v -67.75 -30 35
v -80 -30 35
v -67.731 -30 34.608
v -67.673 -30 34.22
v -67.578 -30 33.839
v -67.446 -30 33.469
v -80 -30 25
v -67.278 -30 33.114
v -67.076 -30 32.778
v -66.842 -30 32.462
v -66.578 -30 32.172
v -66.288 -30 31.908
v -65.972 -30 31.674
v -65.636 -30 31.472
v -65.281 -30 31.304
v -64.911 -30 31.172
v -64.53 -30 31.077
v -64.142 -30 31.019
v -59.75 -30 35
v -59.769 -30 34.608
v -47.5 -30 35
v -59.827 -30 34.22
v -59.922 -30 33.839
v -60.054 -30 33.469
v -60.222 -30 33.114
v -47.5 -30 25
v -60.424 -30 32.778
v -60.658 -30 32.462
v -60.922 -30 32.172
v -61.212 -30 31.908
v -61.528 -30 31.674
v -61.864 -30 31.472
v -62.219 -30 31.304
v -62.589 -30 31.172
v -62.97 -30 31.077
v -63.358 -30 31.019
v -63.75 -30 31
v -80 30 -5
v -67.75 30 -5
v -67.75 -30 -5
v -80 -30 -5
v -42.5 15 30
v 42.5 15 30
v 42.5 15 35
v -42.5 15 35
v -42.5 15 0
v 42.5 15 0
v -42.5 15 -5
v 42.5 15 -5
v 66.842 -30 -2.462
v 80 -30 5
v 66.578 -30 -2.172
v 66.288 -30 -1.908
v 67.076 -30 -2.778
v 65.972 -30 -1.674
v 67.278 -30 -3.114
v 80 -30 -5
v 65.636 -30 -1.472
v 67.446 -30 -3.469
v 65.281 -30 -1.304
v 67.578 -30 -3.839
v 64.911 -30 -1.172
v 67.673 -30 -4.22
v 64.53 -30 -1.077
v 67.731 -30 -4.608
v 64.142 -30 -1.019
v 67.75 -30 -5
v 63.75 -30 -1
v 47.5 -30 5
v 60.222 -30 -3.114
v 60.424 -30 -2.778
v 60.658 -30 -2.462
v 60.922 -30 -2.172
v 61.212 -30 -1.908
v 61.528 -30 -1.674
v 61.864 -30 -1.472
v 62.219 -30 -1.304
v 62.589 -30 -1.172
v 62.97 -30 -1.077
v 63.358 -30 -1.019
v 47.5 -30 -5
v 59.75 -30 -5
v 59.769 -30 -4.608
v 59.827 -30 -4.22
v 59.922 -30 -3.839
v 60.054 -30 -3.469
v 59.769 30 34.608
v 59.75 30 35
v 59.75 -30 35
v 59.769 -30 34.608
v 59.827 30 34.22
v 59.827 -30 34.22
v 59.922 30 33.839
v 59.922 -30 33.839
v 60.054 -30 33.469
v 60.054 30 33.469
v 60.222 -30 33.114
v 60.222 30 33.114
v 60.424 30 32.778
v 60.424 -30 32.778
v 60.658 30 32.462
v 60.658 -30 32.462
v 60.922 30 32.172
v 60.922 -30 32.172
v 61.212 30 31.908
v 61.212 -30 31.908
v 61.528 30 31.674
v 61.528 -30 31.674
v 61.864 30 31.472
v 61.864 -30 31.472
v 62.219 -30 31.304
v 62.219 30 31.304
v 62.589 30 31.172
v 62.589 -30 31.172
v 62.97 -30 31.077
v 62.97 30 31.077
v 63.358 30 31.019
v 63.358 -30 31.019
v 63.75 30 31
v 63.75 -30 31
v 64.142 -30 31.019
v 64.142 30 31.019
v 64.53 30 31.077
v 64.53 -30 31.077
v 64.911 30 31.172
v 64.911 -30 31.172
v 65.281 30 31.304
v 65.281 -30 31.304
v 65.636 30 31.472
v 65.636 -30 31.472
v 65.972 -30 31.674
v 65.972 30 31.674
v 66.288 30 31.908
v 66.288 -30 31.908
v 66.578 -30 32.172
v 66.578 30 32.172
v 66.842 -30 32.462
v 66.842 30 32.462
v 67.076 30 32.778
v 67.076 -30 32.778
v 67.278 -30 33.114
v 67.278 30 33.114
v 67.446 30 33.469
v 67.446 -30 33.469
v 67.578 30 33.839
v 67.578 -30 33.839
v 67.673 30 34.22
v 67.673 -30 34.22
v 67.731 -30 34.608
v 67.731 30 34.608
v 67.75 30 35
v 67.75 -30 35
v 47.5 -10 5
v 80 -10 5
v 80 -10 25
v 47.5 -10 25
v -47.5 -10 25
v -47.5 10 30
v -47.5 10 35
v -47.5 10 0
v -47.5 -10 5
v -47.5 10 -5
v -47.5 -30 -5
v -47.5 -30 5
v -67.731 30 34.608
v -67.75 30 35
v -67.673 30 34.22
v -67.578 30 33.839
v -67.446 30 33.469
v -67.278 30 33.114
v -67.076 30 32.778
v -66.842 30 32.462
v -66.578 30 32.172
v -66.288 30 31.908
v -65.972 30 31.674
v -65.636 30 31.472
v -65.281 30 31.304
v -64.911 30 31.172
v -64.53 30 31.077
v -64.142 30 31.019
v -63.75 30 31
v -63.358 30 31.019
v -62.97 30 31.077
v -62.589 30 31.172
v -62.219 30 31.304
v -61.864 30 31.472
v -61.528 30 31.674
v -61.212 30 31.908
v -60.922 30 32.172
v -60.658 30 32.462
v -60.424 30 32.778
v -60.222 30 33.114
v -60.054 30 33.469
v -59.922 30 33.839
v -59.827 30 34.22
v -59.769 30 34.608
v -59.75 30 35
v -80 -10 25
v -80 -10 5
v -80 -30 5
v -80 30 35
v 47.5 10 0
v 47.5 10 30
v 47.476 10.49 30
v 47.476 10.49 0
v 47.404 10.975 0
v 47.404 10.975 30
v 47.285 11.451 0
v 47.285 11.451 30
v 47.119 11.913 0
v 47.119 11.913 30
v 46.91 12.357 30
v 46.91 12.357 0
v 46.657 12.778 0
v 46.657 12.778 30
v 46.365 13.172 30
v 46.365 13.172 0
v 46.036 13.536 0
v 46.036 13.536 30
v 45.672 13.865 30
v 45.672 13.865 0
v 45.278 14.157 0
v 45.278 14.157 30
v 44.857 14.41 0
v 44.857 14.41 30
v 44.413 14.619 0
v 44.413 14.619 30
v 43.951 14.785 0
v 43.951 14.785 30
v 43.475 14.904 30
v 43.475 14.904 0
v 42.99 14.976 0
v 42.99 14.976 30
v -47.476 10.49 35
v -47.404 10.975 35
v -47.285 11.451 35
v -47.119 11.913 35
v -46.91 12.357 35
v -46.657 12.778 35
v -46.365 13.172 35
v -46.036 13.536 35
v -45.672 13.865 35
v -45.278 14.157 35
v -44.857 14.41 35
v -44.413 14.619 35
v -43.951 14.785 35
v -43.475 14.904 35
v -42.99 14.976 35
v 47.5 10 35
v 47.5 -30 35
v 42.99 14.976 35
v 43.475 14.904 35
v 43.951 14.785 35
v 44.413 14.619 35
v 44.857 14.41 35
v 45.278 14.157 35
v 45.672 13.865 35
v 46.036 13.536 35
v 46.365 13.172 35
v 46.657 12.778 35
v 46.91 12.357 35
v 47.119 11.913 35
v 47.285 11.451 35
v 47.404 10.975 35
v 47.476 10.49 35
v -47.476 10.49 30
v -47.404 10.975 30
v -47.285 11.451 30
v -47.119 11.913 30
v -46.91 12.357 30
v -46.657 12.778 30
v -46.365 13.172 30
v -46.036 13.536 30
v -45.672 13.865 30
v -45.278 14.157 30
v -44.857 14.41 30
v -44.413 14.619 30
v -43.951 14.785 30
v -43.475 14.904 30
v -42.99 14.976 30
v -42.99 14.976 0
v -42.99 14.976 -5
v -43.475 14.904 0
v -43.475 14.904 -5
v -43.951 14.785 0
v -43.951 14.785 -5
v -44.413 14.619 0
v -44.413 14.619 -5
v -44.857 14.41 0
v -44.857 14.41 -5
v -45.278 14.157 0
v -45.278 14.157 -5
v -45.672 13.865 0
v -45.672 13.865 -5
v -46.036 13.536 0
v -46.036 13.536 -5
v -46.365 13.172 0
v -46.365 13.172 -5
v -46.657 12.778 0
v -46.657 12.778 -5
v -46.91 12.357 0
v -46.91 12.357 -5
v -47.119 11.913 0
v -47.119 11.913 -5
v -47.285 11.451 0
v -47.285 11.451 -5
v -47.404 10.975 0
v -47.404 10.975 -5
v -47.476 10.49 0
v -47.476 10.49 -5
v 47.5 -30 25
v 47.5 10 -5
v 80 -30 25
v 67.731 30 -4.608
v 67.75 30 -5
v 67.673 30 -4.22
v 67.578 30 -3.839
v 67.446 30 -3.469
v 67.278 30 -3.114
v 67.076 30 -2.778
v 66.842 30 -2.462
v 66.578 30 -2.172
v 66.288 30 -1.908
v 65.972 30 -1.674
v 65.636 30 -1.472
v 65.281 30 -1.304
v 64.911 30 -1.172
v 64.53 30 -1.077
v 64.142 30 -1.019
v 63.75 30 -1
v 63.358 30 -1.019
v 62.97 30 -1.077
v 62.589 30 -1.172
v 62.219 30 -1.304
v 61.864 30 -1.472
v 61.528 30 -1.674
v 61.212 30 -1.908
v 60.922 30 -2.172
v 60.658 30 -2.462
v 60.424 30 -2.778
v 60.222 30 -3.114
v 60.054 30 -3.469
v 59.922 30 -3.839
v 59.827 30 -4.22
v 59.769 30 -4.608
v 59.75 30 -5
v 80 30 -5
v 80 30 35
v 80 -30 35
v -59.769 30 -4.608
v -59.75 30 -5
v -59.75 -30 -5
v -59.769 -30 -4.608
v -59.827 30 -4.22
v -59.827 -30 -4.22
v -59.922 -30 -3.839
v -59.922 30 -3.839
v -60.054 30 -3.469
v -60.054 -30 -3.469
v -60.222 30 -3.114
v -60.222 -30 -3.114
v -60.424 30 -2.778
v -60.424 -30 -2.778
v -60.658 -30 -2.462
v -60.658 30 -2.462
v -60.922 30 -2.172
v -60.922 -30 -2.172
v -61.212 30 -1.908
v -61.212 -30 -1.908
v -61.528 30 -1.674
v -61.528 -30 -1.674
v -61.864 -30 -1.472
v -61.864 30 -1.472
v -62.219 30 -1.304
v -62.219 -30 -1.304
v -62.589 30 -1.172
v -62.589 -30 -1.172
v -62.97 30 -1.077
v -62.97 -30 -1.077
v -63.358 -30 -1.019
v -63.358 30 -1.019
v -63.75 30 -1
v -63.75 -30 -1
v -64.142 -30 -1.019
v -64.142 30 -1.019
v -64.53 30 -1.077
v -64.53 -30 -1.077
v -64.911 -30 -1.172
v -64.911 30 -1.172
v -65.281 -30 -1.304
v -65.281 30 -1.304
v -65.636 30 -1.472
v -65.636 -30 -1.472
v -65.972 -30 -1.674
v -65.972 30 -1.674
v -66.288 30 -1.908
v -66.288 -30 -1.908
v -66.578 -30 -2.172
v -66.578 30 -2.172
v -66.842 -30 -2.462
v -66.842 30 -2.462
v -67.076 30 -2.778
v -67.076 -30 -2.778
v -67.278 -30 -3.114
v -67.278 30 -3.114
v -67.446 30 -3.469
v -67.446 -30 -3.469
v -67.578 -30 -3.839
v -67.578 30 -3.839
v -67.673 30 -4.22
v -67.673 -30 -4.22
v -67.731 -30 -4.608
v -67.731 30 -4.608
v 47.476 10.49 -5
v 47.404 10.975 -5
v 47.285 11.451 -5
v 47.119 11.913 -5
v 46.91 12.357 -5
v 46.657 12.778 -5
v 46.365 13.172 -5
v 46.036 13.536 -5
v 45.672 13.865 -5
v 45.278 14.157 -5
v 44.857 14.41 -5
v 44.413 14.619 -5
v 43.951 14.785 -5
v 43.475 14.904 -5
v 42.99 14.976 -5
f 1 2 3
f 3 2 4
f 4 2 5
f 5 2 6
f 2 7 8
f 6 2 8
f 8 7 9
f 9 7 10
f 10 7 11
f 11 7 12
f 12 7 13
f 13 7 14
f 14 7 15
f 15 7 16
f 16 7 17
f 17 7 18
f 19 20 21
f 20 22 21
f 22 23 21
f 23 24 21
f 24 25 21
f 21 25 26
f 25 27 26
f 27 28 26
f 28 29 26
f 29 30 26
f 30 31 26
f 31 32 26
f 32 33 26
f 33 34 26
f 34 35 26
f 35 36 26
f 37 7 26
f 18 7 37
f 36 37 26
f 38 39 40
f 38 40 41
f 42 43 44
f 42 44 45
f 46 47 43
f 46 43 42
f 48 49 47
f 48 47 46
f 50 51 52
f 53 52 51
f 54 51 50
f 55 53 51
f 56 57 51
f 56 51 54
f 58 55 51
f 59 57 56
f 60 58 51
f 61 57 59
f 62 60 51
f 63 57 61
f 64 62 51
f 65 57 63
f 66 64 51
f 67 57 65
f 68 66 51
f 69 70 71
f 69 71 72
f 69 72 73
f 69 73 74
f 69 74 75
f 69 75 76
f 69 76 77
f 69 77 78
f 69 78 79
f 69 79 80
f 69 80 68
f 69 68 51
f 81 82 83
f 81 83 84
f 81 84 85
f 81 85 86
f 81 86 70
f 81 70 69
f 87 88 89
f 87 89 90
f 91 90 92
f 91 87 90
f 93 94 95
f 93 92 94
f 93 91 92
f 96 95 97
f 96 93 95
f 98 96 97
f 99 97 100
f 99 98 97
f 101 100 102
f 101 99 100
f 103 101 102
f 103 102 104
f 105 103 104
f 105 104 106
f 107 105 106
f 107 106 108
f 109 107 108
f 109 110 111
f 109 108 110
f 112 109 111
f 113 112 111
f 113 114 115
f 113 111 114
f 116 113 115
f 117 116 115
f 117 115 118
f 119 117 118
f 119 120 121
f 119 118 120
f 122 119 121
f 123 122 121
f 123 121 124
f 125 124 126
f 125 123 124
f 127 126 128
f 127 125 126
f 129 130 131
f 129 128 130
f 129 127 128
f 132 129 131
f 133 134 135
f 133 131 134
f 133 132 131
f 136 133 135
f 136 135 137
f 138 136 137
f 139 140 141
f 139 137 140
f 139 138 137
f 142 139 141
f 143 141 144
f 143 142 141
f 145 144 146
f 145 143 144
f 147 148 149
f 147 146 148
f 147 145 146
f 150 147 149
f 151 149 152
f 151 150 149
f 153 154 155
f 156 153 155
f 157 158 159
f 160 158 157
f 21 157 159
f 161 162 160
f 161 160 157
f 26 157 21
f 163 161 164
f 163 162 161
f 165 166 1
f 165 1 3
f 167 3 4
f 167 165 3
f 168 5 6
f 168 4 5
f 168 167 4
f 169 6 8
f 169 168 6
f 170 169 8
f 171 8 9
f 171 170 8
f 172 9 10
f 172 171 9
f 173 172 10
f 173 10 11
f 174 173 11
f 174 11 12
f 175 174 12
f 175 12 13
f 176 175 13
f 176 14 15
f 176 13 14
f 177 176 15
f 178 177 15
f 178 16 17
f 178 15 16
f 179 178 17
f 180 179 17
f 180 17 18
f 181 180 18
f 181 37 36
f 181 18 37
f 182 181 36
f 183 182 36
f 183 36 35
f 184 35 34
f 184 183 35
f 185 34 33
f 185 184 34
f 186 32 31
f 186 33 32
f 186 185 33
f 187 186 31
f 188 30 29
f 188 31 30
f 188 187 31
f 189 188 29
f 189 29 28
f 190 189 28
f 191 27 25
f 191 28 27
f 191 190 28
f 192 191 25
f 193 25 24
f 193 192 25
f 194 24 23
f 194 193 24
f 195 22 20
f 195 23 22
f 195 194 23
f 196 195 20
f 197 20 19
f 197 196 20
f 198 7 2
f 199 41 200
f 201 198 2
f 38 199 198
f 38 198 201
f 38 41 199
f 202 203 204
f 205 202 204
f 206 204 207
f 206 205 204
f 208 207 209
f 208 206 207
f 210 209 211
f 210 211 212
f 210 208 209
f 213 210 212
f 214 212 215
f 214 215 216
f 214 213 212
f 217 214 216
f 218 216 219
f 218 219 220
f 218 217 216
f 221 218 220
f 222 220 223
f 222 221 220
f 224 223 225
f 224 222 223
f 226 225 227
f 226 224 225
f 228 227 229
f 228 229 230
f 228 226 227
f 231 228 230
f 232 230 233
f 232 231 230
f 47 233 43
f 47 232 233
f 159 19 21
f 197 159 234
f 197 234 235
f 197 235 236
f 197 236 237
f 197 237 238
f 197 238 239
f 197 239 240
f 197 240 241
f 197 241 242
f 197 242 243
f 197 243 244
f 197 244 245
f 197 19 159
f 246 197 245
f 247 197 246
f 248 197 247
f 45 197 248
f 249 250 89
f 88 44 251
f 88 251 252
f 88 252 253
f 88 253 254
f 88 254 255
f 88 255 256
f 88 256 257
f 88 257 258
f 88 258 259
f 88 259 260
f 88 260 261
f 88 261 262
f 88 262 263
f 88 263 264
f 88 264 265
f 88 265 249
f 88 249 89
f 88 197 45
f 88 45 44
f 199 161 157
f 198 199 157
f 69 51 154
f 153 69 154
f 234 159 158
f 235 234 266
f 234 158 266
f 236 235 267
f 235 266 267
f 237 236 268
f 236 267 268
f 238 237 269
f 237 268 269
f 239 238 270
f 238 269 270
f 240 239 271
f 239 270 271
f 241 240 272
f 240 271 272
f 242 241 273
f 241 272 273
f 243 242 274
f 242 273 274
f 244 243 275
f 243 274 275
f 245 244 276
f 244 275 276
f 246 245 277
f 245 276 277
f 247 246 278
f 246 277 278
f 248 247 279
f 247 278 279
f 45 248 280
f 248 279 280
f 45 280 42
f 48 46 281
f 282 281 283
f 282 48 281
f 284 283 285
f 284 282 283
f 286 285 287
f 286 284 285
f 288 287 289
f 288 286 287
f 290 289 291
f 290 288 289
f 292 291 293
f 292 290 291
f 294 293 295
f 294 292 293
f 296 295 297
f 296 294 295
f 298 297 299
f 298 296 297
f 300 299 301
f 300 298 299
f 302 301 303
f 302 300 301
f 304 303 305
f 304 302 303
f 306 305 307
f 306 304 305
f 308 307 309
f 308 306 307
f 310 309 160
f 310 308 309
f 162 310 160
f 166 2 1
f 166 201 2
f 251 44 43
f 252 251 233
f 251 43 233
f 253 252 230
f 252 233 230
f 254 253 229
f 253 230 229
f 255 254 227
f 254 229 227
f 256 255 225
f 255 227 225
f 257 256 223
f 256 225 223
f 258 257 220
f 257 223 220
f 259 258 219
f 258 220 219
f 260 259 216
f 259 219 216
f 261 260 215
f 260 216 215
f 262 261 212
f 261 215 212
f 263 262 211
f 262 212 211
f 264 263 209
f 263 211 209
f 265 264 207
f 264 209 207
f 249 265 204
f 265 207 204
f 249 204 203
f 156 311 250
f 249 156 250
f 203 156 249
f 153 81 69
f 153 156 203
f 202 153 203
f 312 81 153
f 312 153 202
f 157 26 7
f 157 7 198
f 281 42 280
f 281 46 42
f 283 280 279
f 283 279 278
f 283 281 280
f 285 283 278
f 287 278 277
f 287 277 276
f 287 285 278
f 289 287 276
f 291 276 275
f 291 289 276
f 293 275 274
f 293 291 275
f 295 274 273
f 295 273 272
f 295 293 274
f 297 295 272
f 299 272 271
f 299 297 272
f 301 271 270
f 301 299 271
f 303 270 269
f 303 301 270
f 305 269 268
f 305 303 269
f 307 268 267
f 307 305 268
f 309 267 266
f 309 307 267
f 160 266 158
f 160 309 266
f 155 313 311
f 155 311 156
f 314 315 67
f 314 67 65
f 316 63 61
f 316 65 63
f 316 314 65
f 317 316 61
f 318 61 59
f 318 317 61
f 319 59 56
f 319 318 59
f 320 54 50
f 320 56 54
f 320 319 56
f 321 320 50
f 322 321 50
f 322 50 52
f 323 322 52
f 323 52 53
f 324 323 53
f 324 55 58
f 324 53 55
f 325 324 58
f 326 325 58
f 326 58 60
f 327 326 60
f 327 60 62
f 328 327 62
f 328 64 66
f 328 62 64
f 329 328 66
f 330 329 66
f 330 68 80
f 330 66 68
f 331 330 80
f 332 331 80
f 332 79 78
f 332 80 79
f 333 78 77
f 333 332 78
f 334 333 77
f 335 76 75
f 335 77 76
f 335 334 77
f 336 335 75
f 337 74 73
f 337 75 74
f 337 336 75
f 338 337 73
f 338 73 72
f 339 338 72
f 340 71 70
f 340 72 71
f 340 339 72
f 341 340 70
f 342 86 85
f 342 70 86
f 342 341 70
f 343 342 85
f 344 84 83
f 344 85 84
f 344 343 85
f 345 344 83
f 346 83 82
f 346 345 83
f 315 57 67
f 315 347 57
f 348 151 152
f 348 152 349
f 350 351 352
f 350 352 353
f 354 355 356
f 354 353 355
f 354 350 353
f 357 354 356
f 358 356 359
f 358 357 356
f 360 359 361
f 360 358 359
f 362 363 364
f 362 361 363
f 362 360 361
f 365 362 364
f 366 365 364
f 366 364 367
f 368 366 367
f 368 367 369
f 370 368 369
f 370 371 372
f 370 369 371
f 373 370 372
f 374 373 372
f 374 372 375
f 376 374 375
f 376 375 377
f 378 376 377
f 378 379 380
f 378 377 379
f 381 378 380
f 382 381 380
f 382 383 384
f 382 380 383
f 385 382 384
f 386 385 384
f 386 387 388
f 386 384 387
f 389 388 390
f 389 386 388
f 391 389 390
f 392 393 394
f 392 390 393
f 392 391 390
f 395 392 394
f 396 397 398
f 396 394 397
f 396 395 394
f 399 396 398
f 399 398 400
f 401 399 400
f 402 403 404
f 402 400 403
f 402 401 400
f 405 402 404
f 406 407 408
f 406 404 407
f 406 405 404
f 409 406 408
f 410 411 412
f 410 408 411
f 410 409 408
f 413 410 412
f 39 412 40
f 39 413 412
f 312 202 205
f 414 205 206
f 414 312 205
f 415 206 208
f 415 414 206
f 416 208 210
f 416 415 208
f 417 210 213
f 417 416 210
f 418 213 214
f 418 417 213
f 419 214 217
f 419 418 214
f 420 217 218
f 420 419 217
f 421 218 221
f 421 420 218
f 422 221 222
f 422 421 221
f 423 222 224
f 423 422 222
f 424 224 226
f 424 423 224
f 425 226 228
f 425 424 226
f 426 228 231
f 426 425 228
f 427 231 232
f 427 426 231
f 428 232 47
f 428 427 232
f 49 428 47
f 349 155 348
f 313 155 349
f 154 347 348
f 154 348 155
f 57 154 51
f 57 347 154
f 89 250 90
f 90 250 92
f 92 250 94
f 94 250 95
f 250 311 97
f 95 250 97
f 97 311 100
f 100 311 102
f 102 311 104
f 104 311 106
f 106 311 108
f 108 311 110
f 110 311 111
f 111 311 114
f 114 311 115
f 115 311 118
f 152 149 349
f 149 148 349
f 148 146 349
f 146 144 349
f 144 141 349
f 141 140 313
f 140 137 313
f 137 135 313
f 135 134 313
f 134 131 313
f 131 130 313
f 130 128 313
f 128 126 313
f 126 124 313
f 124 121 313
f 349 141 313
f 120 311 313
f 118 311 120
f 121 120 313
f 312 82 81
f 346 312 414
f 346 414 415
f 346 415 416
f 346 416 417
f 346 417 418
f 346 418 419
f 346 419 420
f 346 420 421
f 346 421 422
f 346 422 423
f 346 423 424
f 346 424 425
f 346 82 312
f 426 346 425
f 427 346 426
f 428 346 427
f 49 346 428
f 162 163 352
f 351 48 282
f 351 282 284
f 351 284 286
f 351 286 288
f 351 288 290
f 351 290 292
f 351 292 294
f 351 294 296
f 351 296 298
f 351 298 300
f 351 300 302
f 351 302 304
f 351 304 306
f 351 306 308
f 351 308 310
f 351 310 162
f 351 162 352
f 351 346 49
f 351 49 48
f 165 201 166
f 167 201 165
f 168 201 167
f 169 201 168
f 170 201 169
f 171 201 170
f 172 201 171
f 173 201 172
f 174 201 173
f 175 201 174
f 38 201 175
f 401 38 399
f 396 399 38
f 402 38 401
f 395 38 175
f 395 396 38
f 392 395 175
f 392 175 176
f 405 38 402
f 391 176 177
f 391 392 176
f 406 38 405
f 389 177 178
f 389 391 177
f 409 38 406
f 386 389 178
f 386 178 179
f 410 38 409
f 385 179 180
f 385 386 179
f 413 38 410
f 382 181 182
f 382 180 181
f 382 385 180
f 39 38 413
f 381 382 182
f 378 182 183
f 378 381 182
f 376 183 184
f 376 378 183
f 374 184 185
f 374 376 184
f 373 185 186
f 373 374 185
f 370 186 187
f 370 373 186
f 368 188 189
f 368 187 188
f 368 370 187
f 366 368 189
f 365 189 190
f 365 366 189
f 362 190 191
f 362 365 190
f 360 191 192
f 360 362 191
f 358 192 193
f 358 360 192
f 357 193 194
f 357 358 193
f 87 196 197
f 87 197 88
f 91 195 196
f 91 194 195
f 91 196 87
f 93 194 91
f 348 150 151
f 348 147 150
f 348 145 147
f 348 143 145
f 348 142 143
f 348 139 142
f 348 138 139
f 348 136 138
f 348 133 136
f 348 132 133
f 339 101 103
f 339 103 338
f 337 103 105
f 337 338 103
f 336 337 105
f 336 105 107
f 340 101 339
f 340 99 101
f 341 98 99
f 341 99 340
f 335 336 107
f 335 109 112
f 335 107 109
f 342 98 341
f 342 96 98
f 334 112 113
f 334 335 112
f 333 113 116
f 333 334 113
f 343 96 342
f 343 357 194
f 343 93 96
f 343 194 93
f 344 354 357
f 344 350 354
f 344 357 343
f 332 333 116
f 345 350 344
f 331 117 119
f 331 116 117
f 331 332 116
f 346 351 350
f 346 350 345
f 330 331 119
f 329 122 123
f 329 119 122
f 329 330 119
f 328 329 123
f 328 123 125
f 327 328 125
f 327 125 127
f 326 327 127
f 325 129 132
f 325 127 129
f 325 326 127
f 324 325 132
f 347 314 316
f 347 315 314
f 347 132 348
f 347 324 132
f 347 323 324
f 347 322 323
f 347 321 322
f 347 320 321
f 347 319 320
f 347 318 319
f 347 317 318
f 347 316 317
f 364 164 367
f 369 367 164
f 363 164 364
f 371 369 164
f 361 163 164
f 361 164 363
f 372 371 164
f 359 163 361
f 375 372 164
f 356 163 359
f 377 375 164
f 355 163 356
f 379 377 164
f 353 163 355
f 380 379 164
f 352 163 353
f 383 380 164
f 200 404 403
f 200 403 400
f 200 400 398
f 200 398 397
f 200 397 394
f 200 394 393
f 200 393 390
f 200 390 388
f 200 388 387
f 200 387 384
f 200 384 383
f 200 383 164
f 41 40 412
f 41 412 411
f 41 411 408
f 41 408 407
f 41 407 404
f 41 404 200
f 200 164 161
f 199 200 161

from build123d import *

# Parameters (mm, degrees)
SKETCH_1_W               = 160
SKETCH_1_H               = 60
EXTRUDE_1_DEPTH          = 30
SKETCH_2_W               = 20
SKETCH_2_H               = 40
CUT_EXTRUDE_1_DEPTH      = 171
SKETCH_3_W               = 95
SKETCH_3_H               = 90
CUT_EXTRUDE_2_DEPTH      = 171
FILLET_1_R               = 5
EXTRUDE_2_DEPTH          = 5
EXTRUDE_START            = 5
EXTRUDE_3_DEPTH          = 5
CUT_EXTRUDE_3_DEPTH      = 91
CUT_EXTRUDE_3_DEPTH_BACK = 33
SKETCH_6_R               = 4


with BuildPart() as part:
    # 草图1 → 凸台-拉伸1 (new body)
    with BuildSketch(Plane.XY):
        Rectangle(SKETCH_1_W, SKETCH_1_H)
    extrude(amount=EXTRUDE_1_DEPTH)

    # 草图2 → 切除-拉伸1 (cut)
    with BuildSketch(Plane.ZY.offset(80)):
        with Locations((15, -30)):
            Rectangle(SKETCH_2_W, SKETCH_2_H)
    extrude(amount=-CUT_EXTRUDE_1_DEPTH, mode=Mode.SUBTRACT)

    # 草图3 → 切除-拉伸2 (cut)
    with BuildSketch(Plane.XY.offset(30)):
        with Locations((0, -30)):
            Rectangle(SKETCH_3_W, SKETCH_3_H)
    extrude(amount=-CUT_EXTRUDE_2_DEPTH, mode=Mode.SUBTRACT)

    # 圆角1
    fillet_1_edges = [part.edges().sort_by_distance(p)[0] for p in [
        (-47.5, 15, 15),
        (47.5, 15, 15),
    ]]
    fillet(fillet_1_edges, radius=FILLET_1_R)

    # 草图4 → 凸台-拉伸2 (add)
    with BuildSketch(Plane.XY.offset(30)):
        with BuildLine():
            Line((-47.5, -30), (-47.5, 10))
            ThreePointArc((-47.5, 10), (-46.035533906, 13.535533906), (-42.5, 15))
            Line((-42.5, 15), (42.5, 15))
            ThreePointArc((42.5, 15), (46.035533906, 13.535533906), (47.5, 10))
            Line((47.5, 10), (47.5, -30))
            Line((47.5, -30), (80, -30))
            Line((80, -30), (80, 30))
            Line((80, 30), (-80, 30))
            Line((-80, 30), (-80, -30))
            Line((-80, -30), (-47.5, -30))
        make_face()
    extrude(amount=EXTRUDE_2_DEPTH)

    # 草图5 → 凸台-拉伸3 (add)
    with BuildSketch(Plane(origin=(0, 0, 0), x_dir=(-1, 0, 0), z_dir=(0, 0, -1)).offset(EXTRUDE_START)):
        with BuildLine():
            Line((-47.5, -30), (-47.5, 10))
            ThreePointArc((-47.5, 10), (-46.035533906, 13.535533906), (-42.5, 15))
            Line((-42.5, 15), (42.5, 15))
            ThreePointArc((42.5, 15), (46.035533906, 13.535533906), (47.5, 10))
            Line((47.5, 10), (47.5, -30))
            Line((47.5, -30), (80, -30))
            Line((80, -30), (80, 30))
            Line((80, 30), (-80, 30))
            Line((-80, 30), (-80, -30))
            Line((-80, -30), (-47.5, -30))
        make_face()
    extrude(amount=-EXTRUDE_3_DEPTH)

    # 草图6 → 切除-拉伸3 (cut, two sides: drawn at the far end of the back side and taken through both)
    with BuildSketch(Plane.XZ.offset(-15).offset(-CUT_EXTRUDE_3_DEPTH_BACK)):
        with Locations((-63.75, 35)):
            Circle(SKETCH_6_R)
        with Locations((-63.75, -5)):
            Circle(SKETCH_6_R)
        with Locations((63.75, -5)):
            Circle(SKETCH_6_R)
        with Locations((63.75, 35)):
            Circle(SKETCH_6_R)
    extrude(amount=CUT_EXTRUDE_3_DEPTH + CUT_EXTRUDE_3_DEPTH_BACK, mode=Mode.SUBTRACT)


solid = part.part
